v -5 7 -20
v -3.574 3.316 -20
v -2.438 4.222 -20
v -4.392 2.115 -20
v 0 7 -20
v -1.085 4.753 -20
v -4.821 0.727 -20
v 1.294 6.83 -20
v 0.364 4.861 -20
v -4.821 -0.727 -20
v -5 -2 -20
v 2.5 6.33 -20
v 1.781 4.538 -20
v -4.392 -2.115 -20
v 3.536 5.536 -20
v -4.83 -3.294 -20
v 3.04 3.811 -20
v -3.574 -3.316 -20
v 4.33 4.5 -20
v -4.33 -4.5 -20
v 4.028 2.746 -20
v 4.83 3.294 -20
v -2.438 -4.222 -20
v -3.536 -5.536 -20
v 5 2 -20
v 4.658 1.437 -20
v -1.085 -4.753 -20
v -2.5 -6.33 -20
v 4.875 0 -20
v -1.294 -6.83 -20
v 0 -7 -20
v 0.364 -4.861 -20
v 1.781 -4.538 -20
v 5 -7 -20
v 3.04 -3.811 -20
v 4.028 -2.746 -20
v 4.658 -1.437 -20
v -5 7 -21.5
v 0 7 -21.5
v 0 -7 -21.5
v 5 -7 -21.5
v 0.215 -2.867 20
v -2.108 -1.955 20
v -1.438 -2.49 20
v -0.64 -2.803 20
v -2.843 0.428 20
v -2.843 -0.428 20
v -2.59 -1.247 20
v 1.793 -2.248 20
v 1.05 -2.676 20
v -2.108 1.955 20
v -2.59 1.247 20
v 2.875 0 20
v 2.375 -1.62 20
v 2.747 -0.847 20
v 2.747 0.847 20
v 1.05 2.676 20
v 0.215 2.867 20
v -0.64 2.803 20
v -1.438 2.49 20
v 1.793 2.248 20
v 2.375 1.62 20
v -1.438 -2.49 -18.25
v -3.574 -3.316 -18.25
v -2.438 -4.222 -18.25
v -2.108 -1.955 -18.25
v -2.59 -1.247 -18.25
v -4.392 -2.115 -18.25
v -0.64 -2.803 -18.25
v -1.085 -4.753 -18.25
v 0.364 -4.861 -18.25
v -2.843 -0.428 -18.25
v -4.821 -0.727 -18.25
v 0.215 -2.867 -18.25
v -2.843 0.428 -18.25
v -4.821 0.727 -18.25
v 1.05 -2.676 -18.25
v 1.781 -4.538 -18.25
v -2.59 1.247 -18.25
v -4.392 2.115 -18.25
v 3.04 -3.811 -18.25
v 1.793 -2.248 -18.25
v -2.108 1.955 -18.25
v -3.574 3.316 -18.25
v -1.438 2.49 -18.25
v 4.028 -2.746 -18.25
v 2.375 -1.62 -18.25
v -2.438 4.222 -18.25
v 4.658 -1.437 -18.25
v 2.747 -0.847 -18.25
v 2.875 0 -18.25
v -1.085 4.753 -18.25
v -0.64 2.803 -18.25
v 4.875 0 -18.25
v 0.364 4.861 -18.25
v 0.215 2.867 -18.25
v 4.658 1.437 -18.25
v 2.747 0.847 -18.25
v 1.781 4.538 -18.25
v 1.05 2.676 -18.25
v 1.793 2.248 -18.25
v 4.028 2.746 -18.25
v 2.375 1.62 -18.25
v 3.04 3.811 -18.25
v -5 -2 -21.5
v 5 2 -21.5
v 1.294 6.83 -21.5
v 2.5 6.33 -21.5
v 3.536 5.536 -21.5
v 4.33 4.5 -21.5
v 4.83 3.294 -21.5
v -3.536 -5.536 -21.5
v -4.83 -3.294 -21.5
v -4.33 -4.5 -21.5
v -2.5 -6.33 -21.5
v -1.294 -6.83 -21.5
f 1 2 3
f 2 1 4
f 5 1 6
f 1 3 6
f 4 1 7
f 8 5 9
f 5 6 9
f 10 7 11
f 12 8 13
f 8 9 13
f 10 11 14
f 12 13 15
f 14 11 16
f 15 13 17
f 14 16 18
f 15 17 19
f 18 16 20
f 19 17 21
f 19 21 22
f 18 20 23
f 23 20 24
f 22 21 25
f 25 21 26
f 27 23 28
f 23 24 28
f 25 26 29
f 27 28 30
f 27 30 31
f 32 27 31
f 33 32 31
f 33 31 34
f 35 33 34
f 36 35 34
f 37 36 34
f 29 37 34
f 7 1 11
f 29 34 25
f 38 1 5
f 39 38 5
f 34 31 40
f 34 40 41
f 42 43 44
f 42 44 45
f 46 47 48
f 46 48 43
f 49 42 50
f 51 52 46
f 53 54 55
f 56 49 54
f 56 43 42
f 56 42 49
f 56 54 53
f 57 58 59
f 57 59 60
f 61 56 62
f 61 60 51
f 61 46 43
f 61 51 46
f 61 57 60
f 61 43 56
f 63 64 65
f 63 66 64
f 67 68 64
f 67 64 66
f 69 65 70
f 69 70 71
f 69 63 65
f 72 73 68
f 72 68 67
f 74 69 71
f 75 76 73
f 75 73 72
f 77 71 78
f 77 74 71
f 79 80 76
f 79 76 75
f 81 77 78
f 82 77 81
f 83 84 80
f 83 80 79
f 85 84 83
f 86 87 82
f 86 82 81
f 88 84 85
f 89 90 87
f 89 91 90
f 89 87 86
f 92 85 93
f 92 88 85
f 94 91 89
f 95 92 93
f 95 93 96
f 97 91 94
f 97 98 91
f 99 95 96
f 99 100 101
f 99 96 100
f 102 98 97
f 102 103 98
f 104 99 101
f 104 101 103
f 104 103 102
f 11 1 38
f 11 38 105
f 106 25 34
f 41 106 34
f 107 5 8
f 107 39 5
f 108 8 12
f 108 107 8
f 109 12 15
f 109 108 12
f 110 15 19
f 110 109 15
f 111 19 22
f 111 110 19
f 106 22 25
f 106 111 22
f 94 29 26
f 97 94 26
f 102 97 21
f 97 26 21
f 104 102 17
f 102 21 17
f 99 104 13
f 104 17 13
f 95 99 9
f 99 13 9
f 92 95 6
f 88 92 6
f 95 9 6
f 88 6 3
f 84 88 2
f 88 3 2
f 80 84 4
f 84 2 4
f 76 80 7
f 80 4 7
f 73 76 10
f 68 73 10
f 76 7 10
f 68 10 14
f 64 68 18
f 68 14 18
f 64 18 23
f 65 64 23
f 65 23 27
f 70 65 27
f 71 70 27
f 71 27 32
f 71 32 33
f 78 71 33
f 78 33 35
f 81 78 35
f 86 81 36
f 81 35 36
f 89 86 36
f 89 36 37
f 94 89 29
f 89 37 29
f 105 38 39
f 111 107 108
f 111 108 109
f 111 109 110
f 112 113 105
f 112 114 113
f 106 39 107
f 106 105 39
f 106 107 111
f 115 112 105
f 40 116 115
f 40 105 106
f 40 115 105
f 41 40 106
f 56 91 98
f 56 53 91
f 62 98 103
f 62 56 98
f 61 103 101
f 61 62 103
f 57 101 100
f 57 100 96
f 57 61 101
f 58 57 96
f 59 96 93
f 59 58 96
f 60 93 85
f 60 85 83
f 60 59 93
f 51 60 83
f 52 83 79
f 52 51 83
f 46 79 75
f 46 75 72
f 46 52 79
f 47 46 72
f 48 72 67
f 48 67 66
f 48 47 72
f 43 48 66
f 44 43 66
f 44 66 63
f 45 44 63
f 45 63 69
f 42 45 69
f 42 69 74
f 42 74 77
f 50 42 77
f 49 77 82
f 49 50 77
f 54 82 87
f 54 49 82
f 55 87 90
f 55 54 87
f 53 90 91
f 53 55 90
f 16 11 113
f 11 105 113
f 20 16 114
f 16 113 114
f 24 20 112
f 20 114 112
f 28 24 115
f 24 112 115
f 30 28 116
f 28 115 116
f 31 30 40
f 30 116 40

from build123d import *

# Parameters (mm, degrees)
F0_R     = 2.875
F1_DEPTH = 20
F2_W     = 10
F2_H     = 14
F2_R     = 2.875
F3_DEPTH = 1.5
F4_R     = 5
F5_R     = 4.875
F5_R_2   = 2.875
F6_DEPTH = 1.75


with BuildPart() as f1:
    # F0 (on Top) → F1 (new body, symmetric)
    with BuildSketch(Plane.XY):
        Circle(F0_R)
    extrude(amount=F1_DEPTH, both=True)

    # F2 (on face) → F3 (join)
    with BuildSketch(Plane(origin=(0, 0, -20), x_dir=(1, 0, 0), z_dir=(0, 0, -1))):
        Rectangle(F2_W, F2_H)
        Circle(F2_R, mode=Mode.SUBTRACT)
        Circle(F2_R)
    extrude(amount=F3_DEPTH)

    # F4
    f4_edges = [f1.edges().sort_by_distance(p)[0] for p in [
        (-5, -7, -20.75),
        (5, 7, -20.75),
    ]]
    fillet(f4_edges, radius=F4_R)

    # F5 (on face) → F6 (join)
    with BuildSketch(Plane.XY.offset(-20)):
        Circle(F5_R)
        Circle(F5_R_2, mode=Mode.SUBTRACT)
    extrude(amount=F6_DEPTH)


solid = f1.part
